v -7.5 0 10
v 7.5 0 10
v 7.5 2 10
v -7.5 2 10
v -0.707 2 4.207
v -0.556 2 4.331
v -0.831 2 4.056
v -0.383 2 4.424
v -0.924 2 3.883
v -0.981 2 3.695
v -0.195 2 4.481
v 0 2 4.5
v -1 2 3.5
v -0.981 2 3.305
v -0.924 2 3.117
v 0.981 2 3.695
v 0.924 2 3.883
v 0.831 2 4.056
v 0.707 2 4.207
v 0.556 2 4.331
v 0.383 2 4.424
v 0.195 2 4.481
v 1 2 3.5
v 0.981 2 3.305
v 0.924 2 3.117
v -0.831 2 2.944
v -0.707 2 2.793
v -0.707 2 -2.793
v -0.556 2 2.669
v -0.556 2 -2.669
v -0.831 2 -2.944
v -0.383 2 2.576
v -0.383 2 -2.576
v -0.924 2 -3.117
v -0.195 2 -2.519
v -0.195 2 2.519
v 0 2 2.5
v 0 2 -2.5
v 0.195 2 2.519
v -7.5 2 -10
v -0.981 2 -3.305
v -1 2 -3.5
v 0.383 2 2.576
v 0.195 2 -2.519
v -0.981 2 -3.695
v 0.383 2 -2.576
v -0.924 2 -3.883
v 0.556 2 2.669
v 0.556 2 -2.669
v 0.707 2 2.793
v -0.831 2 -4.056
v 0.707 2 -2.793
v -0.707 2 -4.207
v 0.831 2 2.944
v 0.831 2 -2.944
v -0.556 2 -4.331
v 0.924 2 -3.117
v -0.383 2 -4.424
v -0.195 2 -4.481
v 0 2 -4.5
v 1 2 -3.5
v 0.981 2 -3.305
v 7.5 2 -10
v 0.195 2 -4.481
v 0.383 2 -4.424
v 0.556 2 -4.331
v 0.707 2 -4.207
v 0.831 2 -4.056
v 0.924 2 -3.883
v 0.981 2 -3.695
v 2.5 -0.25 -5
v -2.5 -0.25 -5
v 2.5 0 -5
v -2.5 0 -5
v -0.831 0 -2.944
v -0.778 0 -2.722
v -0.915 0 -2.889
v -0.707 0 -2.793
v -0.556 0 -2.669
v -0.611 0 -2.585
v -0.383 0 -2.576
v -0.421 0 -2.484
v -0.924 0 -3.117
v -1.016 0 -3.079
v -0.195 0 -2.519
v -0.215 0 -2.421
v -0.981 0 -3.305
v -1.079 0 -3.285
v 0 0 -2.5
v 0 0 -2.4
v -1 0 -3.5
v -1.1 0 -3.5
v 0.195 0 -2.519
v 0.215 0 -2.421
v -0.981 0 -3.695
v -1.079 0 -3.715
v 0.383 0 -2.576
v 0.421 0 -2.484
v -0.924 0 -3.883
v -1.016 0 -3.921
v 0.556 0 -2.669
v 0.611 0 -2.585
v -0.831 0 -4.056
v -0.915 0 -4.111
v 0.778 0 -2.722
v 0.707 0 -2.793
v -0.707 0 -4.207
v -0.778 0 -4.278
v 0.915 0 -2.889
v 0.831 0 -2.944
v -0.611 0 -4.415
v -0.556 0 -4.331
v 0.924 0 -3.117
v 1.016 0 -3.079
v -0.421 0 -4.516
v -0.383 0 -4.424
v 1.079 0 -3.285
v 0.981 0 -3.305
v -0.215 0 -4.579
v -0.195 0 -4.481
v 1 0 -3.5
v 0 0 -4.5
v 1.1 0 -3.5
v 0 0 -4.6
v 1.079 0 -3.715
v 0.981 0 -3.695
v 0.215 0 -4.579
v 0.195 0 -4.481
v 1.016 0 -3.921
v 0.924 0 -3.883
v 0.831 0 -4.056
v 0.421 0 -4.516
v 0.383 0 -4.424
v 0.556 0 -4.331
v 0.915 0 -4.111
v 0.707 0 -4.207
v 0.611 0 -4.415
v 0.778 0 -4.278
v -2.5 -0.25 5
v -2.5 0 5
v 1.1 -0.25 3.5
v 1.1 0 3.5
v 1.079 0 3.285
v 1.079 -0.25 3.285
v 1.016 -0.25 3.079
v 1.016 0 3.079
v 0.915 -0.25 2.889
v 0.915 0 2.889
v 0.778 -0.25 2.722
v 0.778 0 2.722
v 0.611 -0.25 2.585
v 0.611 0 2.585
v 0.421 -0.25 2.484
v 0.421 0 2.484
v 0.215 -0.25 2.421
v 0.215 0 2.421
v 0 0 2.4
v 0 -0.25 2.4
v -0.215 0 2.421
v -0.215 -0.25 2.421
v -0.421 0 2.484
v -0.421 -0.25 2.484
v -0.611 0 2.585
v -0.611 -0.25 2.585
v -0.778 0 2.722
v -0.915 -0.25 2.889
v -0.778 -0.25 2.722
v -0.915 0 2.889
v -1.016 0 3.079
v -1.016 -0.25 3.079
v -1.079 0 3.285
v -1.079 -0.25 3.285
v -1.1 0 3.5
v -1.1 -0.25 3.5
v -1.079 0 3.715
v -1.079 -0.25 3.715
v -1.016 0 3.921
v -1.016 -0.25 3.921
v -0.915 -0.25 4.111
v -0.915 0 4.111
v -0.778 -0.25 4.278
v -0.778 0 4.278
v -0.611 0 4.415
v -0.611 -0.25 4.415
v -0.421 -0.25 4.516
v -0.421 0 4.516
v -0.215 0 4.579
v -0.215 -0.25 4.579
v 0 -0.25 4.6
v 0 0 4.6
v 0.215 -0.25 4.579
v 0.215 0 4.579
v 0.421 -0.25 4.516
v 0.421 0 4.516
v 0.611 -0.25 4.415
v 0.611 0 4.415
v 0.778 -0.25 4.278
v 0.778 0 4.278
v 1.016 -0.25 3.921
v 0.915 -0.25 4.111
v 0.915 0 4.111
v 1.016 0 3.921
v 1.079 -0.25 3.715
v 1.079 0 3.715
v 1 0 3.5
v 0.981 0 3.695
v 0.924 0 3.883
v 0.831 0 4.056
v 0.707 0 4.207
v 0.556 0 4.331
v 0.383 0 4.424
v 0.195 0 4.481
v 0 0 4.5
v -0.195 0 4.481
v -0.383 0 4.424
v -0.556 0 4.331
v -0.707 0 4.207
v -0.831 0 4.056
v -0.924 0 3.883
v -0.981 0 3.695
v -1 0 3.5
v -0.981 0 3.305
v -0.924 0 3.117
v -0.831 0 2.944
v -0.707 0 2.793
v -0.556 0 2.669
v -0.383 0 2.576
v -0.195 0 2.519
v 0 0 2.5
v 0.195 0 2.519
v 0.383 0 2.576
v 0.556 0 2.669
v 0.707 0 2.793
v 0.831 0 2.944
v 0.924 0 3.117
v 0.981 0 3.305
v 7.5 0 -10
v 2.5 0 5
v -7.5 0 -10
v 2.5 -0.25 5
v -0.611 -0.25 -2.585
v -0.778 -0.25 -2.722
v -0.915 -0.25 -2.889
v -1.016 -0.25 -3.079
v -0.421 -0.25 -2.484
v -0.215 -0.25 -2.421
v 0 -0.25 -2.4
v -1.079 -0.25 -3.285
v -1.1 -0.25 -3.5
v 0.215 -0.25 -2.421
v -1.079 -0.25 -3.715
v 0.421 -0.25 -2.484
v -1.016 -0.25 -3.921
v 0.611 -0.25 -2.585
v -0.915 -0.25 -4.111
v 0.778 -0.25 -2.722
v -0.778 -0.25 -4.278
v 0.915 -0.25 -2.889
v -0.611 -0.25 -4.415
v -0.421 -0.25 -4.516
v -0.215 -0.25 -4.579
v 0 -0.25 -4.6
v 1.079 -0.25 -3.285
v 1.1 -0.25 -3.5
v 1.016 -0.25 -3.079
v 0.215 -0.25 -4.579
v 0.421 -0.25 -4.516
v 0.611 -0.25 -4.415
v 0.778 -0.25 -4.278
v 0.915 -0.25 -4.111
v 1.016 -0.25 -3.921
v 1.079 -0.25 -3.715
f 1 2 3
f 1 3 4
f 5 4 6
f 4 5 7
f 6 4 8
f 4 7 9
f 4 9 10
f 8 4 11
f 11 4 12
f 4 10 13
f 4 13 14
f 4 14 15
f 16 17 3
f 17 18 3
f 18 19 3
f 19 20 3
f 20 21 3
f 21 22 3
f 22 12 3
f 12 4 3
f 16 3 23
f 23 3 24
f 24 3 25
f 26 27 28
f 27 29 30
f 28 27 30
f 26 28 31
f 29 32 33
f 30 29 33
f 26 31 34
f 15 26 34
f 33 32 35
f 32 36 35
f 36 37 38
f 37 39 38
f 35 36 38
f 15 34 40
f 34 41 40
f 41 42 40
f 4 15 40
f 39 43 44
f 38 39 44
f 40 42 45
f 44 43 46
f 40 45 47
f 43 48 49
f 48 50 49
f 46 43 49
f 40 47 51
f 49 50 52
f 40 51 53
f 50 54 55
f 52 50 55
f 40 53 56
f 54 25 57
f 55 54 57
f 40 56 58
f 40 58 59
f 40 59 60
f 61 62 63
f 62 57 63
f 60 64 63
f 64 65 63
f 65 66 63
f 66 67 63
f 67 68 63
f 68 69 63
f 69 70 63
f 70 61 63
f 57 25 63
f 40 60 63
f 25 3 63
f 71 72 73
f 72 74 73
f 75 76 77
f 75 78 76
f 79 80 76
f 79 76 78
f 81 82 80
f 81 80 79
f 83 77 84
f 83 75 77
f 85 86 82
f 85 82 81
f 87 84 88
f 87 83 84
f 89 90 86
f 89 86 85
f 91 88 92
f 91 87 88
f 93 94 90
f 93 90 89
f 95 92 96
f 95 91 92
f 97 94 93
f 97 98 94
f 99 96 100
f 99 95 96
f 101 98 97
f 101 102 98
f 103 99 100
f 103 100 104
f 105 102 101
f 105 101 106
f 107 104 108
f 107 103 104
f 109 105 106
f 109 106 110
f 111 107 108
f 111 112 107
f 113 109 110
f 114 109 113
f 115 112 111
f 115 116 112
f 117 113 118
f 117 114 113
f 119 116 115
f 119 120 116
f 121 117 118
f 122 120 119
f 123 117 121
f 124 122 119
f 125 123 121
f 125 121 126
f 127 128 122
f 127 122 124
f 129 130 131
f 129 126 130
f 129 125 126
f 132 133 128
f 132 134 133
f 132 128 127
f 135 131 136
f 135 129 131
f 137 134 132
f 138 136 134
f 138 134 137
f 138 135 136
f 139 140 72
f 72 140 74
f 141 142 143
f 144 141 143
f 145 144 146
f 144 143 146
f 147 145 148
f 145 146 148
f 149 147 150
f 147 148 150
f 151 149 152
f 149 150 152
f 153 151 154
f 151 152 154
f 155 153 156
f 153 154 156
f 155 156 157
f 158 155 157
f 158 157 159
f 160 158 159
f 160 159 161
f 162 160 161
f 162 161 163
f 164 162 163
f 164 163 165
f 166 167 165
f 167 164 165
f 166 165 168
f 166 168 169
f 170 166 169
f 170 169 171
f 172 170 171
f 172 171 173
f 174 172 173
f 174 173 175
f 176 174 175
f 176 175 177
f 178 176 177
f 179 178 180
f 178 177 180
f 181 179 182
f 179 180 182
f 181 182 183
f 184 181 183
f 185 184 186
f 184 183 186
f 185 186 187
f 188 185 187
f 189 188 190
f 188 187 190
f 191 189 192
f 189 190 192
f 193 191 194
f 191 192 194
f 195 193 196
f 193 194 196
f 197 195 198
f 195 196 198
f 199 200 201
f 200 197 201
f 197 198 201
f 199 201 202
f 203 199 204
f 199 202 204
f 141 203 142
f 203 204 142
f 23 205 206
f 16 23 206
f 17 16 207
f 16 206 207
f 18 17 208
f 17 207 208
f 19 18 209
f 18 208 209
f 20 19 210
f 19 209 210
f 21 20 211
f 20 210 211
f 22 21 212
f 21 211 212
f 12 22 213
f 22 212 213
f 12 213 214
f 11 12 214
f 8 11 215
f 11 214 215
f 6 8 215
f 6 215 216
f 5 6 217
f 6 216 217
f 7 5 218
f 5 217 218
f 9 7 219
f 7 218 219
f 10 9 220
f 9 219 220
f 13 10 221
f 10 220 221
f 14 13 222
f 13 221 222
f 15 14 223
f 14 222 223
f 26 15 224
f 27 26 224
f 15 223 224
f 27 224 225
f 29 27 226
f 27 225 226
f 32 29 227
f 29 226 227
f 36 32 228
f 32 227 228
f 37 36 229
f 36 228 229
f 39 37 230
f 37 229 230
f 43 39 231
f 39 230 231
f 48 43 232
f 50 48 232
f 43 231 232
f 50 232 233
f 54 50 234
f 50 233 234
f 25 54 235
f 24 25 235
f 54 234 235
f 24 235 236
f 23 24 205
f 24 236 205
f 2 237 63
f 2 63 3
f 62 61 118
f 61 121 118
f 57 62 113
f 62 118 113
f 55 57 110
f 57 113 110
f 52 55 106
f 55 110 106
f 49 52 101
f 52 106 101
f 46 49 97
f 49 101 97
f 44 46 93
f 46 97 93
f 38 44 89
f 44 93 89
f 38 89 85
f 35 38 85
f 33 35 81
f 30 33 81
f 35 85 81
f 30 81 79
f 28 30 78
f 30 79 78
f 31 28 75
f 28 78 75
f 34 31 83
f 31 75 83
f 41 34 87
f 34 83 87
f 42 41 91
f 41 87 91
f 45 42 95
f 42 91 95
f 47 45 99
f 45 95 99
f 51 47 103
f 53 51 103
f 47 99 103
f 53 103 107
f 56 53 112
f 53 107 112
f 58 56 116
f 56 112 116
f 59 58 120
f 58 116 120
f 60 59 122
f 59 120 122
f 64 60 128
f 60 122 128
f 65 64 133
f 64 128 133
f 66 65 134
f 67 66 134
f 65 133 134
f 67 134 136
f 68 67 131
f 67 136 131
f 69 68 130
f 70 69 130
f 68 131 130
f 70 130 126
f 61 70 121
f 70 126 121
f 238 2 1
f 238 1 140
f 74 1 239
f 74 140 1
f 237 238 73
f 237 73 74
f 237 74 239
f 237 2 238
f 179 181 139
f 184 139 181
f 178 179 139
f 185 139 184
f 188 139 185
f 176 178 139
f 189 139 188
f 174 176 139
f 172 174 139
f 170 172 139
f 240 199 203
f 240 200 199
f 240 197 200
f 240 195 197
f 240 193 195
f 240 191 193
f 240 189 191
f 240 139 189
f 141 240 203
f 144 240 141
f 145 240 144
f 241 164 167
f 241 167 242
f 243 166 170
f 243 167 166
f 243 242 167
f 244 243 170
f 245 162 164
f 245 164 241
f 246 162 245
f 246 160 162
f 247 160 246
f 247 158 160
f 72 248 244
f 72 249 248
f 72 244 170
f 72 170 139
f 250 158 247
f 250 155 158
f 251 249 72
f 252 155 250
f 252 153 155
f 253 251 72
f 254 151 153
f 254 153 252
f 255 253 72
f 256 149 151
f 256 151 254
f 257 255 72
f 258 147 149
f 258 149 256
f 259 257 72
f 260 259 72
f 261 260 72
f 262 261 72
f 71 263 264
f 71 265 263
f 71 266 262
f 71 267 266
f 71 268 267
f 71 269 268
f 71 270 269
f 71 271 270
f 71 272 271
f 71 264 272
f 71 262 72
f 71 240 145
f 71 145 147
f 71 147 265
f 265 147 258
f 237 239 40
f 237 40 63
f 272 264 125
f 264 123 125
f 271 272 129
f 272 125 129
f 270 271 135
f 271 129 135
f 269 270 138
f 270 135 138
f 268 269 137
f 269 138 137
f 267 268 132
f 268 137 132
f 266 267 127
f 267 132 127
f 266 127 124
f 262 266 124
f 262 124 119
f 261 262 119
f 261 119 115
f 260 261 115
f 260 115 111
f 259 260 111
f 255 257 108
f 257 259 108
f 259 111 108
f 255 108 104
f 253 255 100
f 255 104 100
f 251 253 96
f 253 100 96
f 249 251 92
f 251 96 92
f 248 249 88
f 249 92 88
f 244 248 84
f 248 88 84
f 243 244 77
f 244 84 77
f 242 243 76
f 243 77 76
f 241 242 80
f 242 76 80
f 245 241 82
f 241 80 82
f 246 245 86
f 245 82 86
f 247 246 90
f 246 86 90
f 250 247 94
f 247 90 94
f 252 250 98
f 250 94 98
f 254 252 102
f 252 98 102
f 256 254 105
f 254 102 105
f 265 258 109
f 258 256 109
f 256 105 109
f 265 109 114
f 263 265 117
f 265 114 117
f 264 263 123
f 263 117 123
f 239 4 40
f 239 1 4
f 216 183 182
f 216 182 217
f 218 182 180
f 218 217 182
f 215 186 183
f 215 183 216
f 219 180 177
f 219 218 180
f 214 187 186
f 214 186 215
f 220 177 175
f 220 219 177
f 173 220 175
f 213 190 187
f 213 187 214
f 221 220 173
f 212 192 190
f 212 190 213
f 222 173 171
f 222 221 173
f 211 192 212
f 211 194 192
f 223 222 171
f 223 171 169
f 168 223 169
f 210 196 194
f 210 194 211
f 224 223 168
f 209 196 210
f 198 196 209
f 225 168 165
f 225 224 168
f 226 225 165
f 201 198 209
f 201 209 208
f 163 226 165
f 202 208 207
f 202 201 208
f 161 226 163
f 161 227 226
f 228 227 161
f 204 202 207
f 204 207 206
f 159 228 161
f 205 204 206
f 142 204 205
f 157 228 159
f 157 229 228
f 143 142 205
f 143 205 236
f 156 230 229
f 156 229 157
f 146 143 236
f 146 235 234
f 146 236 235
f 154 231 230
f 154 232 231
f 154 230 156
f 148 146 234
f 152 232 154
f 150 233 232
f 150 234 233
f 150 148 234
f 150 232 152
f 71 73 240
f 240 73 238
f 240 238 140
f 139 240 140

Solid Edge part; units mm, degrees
sketch "Sketch1" plane through (0, 0, 0) normal (0, -1, 0) x (1, 0, 0)
  line L0 (7.5, 10) -> (-7.5, 10)
  line L1 (-7.5, 10) -> (-7.5, -10)
  line L2 (-7.5, -10) -> (7.5, -10)
  line L3 (7.5, -10) -> (7.5, 10)
  circle A0 centre (0, 3.5) radius 1
  circle A1 centre (0, -3.5) radius 1
  dimension "D1" = 20
  dimension "D2" = 15
extrude "Protrusion1" add sketch "Sketch1" against normal blind 2
sketch "Sketch2" plane through (0, 0, 0) normal (0, -1, 0) x (1, 0, 0)
  line L0 (2.5, -5) -> (2.5, 5)
  line L1 (2.5, 5) -> (-2.5, 5)
  line L2 (-2.5, 5) -> (-2.5, -5)
  line L3 (-2.5, -5) -> (2.5, -5)
  circle A0 centre (0, 3.5) radius 1.1
  circle A1 centre (0, -3.5) radius 1.1
extrude "ExtrudedProtrusion_2" add sketch "Sketch2" along normal blind 0.25
